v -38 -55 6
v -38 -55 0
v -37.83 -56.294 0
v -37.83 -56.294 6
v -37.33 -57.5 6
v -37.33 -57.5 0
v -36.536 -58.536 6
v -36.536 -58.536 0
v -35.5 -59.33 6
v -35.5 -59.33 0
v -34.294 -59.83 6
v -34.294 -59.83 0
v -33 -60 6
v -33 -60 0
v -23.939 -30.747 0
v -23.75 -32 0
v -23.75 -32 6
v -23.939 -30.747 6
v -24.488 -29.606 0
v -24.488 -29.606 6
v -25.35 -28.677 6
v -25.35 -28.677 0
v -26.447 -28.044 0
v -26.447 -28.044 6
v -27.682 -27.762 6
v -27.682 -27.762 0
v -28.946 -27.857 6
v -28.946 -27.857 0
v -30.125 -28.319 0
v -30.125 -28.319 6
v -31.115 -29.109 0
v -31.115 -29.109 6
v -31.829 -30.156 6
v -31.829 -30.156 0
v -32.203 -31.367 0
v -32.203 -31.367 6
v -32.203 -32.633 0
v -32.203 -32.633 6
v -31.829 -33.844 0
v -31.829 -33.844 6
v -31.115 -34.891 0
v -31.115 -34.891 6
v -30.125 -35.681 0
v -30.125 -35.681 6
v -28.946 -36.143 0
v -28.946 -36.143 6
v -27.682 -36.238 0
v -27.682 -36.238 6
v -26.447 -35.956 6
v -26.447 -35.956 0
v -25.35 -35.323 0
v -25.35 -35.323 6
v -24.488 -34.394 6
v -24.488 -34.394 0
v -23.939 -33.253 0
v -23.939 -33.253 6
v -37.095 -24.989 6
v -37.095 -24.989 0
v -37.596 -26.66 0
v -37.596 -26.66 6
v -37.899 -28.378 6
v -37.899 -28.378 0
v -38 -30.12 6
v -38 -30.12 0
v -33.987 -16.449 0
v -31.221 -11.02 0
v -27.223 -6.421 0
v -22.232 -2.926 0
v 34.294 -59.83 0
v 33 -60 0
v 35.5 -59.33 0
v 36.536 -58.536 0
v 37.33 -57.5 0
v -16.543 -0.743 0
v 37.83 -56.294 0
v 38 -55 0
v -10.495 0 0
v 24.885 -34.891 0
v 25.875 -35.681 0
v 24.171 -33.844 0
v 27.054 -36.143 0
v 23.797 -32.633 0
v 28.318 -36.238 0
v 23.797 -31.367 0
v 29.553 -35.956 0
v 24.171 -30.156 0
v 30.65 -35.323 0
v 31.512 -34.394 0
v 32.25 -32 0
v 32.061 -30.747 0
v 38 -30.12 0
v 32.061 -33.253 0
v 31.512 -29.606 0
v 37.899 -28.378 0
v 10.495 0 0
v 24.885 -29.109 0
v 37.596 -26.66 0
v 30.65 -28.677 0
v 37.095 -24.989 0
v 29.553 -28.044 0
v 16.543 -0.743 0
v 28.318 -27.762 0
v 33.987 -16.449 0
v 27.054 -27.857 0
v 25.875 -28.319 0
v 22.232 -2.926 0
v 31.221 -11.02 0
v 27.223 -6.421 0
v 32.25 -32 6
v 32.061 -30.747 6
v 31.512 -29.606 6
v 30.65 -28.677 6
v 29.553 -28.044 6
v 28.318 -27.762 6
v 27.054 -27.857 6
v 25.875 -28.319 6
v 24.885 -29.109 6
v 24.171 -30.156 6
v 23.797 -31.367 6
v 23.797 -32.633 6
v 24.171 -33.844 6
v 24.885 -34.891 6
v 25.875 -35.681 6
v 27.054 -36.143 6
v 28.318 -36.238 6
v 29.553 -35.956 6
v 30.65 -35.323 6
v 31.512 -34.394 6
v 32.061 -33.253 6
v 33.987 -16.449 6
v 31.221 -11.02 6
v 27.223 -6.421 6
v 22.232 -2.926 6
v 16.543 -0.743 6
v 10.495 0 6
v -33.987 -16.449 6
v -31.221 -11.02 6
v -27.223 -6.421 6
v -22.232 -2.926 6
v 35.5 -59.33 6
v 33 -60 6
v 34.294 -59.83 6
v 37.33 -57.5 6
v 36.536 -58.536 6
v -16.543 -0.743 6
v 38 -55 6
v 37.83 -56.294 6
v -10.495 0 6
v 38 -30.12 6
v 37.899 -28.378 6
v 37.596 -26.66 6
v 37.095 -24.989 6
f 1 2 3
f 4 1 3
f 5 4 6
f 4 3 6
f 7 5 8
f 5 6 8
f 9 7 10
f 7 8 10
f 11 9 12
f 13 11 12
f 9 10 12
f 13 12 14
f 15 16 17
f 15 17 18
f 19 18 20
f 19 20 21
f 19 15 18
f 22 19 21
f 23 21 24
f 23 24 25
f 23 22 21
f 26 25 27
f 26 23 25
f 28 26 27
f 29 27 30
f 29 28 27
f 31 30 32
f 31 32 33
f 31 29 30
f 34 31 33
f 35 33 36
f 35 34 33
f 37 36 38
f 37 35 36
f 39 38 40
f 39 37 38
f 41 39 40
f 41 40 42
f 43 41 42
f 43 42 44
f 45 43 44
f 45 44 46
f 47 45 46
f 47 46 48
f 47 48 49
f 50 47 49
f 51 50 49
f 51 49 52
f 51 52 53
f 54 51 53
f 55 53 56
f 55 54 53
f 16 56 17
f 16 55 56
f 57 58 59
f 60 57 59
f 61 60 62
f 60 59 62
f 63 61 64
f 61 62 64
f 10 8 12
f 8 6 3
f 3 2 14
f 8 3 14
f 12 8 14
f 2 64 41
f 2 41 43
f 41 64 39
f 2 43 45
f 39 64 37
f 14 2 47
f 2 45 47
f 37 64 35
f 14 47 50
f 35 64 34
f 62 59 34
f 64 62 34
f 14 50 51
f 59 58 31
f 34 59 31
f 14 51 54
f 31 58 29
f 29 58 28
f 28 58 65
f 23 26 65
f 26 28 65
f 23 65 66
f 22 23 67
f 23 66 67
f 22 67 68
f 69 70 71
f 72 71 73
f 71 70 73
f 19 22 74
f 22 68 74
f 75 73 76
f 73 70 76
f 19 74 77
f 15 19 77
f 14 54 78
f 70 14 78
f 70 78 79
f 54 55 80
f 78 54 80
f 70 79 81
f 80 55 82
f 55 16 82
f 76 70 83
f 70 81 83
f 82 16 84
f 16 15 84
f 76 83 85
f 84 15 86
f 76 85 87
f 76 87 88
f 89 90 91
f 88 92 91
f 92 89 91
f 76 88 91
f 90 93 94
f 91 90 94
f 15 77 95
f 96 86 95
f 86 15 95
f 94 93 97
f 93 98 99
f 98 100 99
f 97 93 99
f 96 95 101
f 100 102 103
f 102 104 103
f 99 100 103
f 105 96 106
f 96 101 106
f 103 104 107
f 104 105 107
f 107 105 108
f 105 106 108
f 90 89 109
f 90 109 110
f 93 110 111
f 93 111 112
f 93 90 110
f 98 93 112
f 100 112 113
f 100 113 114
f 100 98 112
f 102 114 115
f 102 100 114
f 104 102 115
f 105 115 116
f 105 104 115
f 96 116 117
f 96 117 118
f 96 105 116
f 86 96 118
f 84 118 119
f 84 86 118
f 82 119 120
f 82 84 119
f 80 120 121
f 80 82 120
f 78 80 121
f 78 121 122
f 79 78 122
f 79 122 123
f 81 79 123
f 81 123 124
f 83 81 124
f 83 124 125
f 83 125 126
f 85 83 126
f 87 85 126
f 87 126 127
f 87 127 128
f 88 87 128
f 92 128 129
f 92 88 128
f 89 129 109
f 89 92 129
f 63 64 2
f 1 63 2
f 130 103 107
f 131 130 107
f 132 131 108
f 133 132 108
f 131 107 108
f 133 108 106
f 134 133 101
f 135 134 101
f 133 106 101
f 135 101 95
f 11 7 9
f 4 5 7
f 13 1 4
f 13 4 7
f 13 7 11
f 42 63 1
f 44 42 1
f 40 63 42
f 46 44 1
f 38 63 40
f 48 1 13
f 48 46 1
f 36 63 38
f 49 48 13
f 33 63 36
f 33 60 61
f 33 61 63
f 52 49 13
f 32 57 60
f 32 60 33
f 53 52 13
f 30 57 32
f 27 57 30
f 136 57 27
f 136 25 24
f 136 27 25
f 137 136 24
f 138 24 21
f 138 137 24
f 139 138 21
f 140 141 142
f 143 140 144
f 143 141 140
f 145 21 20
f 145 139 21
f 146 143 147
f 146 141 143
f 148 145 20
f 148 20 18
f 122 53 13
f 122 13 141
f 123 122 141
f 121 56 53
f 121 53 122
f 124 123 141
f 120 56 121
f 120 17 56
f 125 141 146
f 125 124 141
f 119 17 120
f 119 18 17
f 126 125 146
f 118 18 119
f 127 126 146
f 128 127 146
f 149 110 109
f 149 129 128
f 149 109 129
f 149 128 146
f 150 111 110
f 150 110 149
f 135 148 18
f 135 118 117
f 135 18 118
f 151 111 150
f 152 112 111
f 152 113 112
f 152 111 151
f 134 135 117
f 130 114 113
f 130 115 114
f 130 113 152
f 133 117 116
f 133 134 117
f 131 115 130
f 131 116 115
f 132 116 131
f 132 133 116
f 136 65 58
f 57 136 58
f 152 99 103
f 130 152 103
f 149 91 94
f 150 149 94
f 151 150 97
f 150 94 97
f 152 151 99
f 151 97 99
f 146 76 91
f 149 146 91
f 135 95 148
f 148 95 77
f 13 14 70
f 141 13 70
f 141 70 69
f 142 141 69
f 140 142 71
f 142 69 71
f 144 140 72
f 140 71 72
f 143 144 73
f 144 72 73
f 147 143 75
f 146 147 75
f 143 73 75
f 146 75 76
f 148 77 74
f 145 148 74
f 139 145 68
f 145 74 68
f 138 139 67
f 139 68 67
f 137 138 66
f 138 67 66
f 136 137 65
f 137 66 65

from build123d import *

# Parameters (mm, degrees)
SKETCH1_R      = 4.25
EXTRUDE1_DEPTH = 6


with BuildPart() as part:
    # Sketch1 → Extrude1 (new body)
    with BuildSketch(Plane.XY):
        with BuildLine():
            Line((38, -55), (38, -30.119678905))
            ThreePointArc((38, -30.119678905), (37.772116295, -27.51495624), (37.095389312, -24.989376755))
            Line((37.095389312, -24.989376755), (33.987127064, -16.449496417))
            ThreePointArc((33.987127064, -16.449496417), (24.834222454, -4.521198893), (10.494811545, 0))
            Line((10.494811545, 0), (-10.494811545, 0))
            ThreePointArc((-10.494811545, 0), (-24.834222454, -4.521198893), (-33.987127064, -16.449496417))
            Line((-33.987127064, -16.449496417), (-37.095389312, -24.989376755))
            ThreePointArc((-37.095389312, -24.989376755), (-37.772116295, -27.51495624), (-38, -30.119678905))
            Line((-38, -30.119678905), (-38, -55))
            ThreePointArc((-38, -55), (-36.535533906, -58.535533906), (-33, -60))
            Line((-33, -60), (33, -60))
            ThreePointArc((33, -60), (36.535533906, -58.535533906), (38, -55))
        make_face()
        with Locations((-28, -32)):
            Circle(SKETCH1_R, mode=Mode.SUBTRACT)
        with Locations((28, -32)):
            Circle(SKETCH1_R, mode=Mode.SUBTRACT)
    extrude(amount=EXTRUDE1_DEPTH)


solid = part.part
